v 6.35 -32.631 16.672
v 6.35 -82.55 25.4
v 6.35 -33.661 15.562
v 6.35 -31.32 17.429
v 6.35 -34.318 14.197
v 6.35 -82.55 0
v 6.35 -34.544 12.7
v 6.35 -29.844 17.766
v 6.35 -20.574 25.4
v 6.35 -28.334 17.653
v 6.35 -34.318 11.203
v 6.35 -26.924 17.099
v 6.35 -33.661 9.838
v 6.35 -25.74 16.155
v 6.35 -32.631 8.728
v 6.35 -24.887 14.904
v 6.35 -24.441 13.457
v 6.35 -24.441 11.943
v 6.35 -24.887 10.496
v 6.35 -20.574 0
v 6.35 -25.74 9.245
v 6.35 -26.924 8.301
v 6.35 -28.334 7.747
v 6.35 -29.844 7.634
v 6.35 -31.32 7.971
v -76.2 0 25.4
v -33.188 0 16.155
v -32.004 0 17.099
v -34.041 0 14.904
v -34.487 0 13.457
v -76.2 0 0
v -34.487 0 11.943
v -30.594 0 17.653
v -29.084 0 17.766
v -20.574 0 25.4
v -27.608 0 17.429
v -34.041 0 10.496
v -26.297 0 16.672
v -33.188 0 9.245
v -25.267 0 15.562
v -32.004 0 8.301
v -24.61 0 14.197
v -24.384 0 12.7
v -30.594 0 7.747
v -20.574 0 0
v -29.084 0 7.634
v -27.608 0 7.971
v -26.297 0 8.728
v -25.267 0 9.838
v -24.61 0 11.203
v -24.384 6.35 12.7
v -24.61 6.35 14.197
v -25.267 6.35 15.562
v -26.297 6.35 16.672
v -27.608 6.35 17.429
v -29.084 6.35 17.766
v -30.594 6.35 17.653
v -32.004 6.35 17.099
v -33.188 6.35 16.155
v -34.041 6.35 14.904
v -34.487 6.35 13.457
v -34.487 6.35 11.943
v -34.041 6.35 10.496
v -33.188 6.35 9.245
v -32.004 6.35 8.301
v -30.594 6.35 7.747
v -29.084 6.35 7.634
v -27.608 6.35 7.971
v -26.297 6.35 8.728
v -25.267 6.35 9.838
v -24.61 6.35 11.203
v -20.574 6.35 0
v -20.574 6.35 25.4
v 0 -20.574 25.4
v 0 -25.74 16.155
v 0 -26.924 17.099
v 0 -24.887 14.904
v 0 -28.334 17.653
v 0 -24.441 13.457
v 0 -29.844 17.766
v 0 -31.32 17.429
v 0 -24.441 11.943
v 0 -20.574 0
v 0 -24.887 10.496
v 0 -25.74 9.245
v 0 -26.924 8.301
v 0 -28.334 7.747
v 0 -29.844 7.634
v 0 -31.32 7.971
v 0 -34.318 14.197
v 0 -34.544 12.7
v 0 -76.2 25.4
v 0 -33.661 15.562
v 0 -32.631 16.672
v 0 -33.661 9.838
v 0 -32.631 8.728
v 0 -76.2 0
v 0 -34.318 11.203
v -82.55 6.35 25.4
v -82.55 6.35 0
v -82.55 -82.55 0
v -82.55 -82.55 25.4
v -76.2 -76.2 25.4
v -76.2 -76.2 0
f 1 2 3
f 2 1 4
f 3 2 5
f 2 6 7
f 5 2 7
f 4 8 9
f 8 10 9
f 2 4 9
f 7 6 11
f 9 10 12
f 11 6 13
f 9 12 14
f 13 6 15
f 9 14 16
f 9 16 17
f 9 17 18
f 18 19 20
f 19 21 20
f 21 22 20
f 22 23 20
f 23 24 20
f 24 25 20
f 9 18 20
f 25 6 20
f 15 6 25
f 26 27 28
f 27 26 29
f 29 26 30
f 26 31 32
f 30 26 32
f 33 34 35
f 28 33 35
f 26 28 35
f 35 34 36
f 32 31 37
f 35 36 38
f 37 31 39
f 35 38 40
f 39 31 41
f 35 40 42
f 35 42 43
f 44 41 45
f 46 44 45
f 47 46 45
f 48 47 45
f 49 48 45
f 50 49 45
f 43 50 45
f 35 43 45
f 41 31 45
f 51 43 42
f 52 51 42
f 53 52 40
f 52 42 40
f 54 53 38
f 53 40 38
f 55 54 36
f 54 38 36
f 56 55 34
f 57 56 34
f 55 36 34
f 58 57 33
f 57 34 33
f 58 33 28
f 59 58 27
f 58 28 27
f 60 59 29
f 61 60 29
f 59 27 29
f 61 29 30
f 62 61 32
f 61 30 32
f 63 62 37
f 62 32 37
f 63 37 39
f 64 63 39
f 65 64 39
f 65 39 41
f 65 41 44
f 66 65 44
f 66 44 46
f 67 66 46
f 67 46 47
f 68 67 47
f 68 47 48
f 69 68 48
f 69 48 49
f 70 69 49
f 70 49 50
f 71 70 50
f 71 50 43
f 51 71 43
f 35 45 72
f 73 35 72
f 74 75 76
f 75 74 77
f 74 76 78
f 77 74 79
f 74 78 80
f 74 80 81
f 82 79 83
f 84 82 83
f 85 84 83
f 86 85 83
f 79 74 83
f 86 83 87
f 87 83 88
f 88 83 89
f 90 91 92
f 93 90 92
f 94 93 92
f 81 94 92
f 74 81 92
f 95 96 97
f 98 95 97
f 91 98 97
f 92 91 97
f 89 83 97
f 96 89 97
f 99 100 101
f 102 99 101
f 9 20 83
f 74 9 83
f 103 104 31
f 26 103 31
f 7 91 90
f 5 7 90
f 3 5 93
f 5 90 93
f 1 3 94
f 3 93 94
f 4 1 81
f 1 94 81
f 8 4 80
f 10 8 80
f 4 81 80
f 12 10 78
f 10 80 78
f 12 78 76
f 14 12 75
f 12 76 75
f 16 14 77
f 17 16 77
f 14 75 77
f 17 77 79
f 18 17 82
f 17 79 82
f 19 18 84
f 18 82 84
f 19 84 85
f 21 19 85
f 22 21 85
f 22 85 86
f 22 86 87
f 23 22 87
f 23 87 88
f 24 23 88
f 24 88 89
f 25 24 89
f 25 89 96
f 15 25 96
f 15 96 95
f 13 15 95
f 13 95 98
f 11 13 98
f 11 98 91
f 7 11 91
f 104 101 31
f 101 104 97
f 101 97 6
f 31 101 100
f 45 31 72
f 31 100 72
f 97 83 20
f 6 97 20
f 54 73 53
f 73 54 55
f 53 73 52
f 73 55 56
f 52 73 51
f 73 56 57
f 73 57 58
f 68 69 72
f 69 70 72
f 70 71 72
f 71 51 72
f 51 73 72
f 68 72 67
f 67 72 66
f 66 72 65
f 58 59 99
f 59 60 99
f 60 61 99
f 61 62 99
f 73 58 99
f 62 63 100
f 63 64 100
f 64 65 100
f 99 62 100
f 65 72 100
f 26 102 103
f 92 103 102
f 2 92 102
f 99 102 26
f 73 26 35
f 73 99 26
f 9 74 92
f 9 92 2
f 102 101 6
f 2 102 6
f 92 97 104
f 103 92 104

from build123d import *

# Parameters (mm, degrees)
F1_DEPTH = 25.4
F2_R     = 5.08
F3_DEPTH = 12.7
F4_R     = 5.08
F5_DEPTH = 6.351


with BuildPart() as f1:
    # F0 (on Top) → F1 (new body)
    with BuildSketch(Plane.XY):
        Polygon((-20.574, 6.35), (-82.55, 6.35), (-82.55, -82.55), (6.35, -82.55), (6.35, -20.574), (0, -20.574), (0, -76.2), (-76.2, -76.2), (-76.2, 0), (-20.574, 0), align=None)
    extrude(amount=F1_DEPTH)

    # F2 (on face) → F3 (cut)
    with BuildSketch(Plane.XZ):
        with Locations((-29.464, 12.7)):
            Circle(F2_R)
    extrude(amount=-F3_DEPTH, mode=Mode.SUBTRACT)

    # F4 (on face) → F5 (cut, through all)
    with BuildSketch(Plane(origin=(0, 0, 0), x_dir=(0, -1, 0), z_dir=(-1, 0, 0))):
        with Locations((29.464, 12.7)):
            Circle(F4_R)
    extrude(amount=-F5_DEPTH, mode=Mode.SUBTRACT)


solid = f1.part
